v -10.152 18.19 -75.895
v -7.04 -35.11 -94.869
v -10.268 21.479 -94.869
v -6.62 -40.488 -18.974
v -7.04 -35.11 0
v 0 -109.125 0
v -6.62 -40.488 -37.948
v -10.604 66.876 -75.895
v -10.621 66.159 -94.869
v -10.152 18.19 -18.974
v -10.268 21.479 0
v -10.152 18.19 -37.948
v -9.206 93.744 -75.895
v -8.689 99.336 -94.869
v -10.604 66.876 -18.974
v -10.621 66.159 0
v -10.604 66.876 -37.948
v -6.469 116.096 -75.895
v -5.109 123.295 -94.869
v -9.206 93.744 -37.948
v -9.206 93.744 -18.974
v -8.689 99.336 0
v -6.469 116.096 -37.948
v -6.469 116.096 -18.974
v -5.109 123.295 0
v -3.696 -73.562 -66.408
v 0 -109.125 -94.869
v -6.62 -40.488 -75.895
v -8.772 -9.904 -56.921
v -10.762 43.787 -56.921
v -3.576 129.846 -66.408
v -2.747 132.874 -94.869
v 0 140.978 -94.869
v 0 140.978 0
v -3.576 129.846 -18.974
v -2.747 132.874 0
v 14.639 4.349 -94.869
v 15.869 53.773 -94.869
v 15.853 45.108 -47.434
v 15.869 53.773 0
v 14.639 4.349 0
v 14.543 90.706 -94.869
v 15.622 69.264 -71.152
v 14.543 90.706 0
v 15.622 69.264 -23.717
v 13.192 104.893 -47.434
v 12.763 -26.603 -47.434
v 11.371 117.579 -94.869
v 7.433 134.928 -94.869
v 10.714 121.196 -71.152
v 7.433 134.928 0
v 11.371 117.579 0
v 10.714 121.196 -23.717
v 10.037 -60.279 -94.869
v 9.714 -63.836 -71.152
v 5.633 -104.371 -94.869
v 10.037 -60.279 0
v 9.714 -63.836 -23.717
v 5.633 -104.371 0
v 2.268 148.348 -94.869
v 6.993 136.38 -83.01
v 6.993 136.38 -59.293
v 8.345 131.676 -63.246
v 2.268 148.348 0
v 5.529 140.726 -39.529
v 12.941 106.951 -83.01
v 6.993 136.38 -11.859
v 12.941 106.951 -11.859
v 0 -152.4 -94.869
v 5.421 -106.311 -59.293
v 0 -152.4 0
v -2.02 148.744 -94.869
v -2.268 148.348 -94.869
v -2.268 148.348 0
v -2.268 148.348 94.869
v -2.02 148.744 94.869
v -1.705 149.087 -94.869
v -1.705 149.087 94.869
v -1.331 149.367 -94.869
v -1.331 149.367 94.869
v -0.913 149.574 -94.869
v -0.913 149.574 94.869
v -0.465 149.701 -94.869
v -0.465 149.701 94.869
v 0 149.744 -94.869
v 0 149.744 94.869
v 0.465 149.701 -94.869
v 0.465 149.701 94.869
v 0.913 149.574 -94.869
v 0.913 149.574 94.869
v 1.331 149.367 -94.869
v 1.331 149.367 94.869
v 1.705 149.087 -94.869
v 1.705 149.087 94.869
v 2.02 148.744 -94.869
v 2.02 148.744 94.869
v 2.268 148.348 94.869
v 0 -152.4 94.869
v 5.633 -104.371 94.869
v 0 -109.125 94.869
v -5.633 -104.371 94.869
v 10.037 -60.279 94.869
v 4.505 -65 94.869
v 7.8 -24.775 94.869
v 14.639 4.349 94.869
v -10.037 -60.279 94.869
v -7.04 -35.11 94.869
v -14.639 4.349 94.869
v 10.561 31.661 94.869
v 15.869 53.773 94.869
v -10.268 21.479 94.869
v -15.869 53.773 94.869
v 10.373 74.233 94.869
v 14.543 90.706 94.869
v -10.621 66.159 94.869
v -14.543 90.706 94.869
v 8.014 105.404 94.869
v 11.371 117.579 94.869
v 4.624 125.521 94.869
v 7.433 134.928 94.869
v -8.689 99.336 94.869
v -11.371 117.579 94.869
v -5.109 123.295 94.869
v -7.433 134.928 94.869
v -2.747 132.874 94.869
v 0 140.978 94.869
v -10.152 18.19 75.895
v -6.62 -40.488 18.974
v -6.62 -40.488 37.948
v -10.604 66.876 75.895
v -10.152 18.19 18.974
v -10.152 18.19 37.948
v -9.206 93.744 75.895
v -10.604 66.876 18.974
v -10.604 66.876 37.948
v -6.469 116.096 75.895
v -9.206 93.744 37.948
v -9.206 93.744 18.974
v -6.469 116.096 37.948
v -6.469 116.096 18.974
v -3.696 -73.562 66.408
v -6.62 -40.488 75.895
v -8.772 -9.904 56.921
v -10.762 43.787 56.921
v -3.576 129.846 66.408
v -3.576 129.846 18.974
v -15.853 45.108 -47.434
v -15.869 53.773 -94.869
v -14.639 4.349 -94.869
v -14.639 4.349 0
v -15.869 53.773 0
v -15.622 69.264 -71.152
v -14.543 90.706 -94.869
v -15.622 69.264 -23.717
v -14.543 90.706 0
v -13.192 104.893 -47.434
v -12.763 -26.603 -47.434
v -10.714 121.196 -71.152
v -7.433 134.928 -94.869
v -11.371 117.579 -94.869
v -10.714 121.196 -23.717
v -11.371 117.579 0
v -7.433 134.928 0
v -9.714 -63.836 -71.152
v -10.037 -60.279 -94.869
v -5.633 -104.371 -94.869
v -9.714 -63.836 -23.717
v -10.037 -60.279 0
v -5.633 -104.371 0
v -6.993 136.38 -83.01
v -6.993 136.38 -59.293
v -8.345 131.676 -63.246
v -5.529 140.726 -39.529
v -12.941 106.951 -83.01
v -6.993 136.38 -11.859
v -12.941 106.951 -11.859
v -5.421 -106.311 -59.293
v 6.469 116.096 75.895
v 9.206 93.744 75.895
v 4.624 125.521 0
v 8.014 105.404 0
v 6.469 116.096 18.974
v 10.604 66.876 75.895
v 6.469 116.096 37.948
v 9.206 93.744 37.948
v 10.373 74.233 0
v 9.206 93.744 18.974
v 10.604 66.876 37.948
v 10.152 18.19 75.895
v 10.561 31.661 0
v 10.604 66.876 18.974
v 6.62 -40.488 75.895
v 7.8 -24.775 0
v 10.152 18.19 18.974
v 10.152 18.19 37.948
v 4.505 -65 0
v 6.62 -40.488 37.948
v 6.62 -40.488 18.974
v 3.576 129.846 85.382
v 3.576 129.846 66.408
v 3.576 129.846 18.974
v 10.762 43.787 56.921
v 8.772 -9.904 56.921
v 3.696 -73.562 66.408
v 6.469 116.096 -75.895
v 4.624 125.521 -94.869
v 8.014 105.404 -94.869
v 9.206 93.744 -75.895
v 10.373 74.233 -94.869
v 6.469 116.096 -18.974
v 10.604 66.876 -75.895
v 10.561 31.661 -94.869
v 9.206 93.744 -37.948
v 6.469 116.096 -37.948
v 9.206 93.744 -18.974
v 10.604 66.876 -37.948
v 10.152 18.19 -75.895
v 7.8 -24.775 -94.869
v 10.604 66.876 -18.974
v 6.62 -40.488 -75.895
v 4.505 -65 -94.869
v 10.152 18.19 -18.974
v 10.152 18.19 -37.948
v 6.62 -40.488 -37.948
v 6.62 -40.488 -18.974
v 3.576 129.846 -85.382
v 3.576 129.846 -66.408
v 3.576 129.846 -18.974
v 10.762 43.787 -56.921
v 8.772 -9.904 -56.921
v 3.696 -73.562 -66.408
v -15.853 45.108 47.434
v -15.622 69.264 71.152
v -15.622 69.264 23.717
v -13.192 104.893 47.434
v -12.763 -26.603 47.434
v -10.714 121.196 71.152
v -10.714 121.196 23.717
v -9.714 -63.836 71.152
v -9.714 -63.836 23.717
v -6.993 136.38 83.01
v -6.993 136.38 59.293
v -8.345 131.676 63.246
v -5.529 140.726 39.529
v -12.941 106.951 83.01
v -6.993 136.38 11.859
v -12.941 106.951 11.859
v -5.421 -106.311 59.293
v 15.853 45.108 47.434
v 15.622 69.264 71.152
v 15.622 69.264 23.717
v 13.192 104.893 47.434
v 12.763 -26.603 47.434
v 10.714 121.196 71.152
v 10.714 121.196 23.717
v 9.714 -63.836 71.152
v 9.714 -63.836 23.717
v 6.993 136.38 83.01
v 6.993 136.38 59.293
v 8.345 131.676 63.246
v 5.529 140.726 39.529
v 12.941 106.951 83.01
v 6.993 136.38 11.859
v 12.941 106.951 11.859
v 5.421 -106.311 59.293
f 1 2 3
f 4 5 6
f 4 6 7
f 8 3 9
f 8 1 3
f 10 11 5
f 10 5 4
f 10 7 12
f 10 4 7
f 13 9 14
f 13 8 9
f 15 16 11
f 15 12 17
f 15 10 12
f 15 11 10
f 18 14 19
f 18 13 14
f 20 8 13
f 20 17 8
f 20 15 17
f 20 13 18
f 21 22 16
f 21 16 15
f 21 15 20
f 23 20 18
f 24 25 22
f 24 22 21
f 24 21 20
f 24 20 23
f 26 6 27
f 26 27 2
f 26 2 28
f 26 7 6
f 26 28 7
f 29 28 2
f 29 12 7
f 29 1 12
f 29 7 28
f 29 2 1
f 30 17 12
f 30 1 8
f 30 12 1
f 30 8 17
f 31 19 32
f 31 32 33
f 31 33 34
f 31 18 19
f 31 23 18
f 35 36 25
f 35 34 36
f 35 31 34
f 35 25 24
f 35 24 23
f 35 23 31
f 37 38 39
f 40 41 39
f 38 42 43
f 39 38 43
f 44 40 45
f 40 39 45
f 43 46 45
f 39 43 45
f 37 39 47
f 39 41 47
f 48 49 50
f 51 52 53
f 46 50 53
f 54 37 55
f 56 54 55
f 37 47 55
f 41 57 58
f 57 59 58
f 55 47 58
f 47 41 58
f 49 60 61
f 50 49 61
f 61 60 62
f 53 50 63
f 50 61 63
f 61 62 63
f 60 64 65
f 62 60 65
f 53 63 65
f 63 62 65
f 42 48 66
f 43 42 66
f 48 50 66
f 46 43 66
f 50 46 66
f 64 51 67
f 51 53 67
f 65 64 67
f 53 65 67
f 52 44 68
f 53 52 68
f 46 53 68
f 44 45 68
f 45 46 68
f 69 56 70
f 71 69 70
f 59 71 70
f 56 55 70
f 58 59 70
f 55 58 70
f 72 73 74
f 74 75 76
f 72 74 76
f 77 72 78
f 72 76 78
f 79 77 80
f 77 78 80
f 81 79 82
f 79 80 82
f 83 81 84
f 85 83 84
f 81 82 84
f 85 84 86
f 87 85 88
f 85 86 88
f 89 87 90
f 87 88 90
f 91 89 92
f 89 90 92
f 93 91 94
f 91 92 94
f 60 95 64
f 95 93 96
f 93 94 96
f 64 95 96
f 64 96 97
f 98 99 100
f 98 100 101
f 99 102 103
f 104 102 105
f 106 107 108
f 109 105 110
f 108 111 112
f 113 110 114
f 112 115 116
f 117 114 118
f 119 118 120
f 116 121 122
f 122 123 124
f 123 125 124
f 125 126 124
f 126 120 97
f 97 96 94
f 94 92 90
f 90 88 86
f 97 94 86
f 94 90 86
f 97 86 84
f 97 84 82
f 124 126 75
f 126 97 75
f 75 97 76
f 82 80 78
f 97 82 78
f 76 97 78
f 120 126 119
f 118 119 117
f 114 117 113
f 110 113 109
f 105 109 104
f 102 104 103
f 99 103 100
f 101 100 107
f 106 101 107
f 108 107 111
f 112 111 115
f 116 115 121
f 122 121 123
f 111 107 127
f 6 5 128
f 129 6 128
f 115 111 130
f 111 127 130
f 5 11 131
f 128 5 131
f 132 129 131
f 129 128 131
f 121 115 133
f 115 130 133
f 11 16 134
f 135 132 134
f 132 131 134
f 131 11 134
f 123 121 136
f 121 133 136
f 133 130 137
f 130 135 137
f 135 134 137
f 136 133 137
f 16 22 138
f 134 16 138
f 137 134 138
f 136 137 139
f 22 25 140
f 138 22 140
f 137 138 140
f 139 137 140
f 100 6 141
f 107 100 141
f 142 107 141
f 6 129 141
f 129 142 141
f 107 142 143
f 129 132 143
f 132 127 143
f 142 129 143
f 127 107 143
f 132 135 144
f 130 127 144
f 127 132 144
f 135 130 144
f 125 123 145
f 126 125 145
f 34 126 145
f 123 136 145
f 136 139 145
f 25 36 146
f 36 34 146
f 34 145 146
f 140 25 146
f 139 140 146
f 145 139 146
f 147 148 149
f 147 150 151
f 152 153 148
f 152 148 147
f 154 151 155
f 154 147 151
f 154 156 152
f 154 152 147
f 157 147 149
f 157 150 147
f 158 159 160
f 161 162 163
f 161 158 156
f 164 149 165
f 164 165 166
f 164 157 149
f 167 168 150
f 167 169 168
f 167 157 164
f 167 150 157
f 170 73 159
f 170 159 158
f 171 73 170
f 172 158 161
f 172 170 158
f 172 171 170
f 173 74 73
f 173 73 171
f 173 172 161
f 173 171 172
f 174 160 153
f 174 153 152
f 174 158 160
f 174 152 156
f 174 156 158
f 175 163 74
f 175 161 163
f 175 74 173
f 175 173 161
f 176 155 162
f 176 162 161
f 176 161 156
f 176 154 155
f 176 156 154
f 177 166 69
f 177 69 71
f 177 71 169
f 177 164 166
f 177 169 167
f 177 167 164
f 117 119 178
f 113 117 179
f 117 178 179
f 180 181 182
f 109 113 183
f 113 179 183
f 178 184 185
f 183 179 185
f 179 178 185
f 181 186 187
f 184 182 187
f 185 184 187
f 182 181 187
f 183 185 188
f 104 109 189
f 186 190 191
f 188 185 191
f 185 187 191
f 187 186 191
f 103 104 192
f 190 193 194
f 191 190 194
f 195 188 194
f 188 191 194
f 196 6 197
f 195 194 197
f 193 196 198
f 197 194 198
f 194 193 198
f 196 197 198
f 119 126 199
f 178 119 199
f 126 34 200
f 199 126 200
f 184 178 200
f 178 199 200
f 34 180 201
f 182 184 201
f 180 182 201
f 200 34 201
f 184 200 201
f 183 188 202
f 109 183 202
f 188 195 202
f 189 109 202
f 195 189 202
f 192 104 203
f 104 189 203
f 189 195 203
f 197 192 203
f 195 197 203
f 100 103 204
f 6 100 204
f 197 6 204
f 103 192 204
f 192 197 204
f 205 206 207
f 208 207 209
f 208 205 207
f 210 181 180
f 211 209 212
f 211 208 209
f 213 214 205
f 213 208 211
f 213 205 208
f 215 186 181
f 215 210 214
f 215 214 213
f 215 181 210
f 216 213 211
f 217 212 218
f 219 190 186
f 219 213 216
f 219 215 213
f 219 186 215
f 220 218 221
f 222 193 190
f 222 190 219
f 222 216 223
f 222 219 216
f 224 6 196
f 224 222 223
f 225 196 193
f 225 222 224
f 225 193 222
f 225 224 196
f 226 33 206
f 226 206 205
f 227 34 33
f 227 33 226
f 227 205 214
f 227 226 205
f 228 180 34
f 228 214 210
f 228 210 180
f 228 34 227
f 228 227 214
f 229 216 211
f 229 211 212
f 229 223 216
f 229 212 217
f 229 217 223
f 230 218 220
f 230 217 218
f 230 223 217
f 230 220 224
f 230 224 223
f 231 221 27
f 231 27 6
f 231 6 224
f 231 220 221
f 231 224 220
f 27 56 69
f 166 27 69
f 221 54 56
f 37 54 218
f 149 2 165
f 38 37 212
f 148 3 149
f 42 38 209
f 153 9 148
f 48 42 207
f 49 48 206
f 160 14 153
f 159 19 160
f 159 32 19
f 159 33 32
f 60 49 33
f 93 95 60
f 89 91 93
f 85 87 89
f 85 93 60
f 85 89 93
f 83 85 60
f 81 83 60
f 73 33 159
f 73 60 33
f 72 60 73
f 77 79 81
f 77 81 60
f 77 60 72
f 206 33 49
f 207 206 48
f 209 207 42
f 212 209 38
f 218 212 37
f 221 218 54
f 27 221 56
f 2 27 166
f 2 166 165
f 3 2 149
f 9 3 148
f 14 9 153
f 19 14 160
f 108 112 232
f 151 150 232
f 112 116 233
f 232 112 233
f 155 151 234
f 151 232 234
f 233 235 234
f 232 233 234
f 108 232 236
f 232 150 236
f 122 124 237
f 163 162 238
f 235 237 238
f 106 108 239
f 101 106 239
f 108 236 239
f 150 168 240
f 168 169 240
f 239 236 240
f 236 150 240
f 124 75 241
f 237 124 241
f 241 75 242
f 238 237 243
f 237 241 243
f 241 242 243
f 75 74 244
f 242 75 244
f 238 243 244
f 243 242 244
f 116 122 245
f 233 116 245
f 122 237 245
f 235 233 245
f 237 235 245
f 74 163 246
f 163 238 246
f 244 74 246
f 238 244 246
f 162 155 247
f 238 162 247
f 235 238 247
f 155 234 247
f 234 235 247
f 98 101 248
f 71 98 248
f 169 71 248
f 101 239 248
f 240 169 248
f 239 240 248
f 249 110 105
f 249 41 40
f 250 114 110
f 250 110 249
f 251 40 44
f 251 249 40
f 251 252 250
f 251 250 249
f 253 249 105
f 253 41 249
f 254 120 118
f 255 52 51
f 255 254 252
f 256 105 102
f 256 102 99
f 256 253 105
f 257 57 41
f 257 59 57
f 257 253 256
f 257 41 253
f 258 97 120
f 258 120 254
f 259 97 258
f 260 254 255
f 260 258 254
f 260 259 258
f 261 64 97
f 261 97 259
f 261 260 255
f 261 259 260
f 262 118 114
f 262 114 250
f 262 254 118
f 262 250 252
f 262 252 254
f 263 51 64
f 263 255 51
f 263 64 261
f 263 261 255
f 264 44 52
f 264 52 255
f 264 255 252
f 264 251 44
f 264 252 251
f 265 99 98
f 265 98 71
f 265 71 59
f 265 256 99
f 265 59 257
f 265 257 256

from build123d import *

# Parameters (mm, degrees)
BOSS_EXTRUDE1_DEPTH = 94.869


with BuildPart() as part:
    # Sketch1 → Boss-Extrude1 (new, symmetric)
    with BuildSketch(Plane.XY):
        with BuildLine():
            ThreePointArc((-2.267771894, 148.348367024), (0, 149.744334404), (2.267771894, 148.348367024))
            add(Edge.make_bspline(
                [(2.267771894, 148.348367024), (30.572440123, 92.24111101), (0, -152.4)],
                knots=[0, 0, 0, 1, 1, 1], degree=2))
            add(Edge.make_bspline(
                [(-2.267771894, 148.348367024), (-30.572440123, 92.24111101), (0, -152.4)],
                knots=[0, 0, 0, 1, 1, 1], degree=2))
        make_face()
        with BuildLine():
            add(Edge.make_bspline(
                [(0, 140.978035645), (3.918482074, 131.156065717), (8.169378172, 106.05556313), (10.242574642, 81.433345605), (11.145665597, 45.040166844), (8.163737965, -35.508846412), (0, -109.12531842)],
                knots=[0.045526815, 0.045526815, 0.045526815, 0.20753057, 0.315533073, 0.423535576, 0.585539331, 0.909546841, 0.909546841, 0.909546841], degree=2))
            add(Edge.make_bspline(
                [(0, -109.12531842), (-8.163737965, -35.508846412), (-11.145665597, 45.040166844), (-10.242574642, 81.433345605), (-8.169378172, 106.05556313), (-3.918482074, 131.156065717), (0, 140.978035645)],
                knots=[0.045526815, 0.045526815, 0.045526815, 0.369534325, 0.53153808, 0.639540583, 0.747543086, 0.909546841, 0.909546841, 0.909546841], degree=2))
        make_face(mode=Mode.SUBTRACT)
    extrude(amount=BOSS_EXTRUDE1_DEPTH, both=True)


solid = part.part
